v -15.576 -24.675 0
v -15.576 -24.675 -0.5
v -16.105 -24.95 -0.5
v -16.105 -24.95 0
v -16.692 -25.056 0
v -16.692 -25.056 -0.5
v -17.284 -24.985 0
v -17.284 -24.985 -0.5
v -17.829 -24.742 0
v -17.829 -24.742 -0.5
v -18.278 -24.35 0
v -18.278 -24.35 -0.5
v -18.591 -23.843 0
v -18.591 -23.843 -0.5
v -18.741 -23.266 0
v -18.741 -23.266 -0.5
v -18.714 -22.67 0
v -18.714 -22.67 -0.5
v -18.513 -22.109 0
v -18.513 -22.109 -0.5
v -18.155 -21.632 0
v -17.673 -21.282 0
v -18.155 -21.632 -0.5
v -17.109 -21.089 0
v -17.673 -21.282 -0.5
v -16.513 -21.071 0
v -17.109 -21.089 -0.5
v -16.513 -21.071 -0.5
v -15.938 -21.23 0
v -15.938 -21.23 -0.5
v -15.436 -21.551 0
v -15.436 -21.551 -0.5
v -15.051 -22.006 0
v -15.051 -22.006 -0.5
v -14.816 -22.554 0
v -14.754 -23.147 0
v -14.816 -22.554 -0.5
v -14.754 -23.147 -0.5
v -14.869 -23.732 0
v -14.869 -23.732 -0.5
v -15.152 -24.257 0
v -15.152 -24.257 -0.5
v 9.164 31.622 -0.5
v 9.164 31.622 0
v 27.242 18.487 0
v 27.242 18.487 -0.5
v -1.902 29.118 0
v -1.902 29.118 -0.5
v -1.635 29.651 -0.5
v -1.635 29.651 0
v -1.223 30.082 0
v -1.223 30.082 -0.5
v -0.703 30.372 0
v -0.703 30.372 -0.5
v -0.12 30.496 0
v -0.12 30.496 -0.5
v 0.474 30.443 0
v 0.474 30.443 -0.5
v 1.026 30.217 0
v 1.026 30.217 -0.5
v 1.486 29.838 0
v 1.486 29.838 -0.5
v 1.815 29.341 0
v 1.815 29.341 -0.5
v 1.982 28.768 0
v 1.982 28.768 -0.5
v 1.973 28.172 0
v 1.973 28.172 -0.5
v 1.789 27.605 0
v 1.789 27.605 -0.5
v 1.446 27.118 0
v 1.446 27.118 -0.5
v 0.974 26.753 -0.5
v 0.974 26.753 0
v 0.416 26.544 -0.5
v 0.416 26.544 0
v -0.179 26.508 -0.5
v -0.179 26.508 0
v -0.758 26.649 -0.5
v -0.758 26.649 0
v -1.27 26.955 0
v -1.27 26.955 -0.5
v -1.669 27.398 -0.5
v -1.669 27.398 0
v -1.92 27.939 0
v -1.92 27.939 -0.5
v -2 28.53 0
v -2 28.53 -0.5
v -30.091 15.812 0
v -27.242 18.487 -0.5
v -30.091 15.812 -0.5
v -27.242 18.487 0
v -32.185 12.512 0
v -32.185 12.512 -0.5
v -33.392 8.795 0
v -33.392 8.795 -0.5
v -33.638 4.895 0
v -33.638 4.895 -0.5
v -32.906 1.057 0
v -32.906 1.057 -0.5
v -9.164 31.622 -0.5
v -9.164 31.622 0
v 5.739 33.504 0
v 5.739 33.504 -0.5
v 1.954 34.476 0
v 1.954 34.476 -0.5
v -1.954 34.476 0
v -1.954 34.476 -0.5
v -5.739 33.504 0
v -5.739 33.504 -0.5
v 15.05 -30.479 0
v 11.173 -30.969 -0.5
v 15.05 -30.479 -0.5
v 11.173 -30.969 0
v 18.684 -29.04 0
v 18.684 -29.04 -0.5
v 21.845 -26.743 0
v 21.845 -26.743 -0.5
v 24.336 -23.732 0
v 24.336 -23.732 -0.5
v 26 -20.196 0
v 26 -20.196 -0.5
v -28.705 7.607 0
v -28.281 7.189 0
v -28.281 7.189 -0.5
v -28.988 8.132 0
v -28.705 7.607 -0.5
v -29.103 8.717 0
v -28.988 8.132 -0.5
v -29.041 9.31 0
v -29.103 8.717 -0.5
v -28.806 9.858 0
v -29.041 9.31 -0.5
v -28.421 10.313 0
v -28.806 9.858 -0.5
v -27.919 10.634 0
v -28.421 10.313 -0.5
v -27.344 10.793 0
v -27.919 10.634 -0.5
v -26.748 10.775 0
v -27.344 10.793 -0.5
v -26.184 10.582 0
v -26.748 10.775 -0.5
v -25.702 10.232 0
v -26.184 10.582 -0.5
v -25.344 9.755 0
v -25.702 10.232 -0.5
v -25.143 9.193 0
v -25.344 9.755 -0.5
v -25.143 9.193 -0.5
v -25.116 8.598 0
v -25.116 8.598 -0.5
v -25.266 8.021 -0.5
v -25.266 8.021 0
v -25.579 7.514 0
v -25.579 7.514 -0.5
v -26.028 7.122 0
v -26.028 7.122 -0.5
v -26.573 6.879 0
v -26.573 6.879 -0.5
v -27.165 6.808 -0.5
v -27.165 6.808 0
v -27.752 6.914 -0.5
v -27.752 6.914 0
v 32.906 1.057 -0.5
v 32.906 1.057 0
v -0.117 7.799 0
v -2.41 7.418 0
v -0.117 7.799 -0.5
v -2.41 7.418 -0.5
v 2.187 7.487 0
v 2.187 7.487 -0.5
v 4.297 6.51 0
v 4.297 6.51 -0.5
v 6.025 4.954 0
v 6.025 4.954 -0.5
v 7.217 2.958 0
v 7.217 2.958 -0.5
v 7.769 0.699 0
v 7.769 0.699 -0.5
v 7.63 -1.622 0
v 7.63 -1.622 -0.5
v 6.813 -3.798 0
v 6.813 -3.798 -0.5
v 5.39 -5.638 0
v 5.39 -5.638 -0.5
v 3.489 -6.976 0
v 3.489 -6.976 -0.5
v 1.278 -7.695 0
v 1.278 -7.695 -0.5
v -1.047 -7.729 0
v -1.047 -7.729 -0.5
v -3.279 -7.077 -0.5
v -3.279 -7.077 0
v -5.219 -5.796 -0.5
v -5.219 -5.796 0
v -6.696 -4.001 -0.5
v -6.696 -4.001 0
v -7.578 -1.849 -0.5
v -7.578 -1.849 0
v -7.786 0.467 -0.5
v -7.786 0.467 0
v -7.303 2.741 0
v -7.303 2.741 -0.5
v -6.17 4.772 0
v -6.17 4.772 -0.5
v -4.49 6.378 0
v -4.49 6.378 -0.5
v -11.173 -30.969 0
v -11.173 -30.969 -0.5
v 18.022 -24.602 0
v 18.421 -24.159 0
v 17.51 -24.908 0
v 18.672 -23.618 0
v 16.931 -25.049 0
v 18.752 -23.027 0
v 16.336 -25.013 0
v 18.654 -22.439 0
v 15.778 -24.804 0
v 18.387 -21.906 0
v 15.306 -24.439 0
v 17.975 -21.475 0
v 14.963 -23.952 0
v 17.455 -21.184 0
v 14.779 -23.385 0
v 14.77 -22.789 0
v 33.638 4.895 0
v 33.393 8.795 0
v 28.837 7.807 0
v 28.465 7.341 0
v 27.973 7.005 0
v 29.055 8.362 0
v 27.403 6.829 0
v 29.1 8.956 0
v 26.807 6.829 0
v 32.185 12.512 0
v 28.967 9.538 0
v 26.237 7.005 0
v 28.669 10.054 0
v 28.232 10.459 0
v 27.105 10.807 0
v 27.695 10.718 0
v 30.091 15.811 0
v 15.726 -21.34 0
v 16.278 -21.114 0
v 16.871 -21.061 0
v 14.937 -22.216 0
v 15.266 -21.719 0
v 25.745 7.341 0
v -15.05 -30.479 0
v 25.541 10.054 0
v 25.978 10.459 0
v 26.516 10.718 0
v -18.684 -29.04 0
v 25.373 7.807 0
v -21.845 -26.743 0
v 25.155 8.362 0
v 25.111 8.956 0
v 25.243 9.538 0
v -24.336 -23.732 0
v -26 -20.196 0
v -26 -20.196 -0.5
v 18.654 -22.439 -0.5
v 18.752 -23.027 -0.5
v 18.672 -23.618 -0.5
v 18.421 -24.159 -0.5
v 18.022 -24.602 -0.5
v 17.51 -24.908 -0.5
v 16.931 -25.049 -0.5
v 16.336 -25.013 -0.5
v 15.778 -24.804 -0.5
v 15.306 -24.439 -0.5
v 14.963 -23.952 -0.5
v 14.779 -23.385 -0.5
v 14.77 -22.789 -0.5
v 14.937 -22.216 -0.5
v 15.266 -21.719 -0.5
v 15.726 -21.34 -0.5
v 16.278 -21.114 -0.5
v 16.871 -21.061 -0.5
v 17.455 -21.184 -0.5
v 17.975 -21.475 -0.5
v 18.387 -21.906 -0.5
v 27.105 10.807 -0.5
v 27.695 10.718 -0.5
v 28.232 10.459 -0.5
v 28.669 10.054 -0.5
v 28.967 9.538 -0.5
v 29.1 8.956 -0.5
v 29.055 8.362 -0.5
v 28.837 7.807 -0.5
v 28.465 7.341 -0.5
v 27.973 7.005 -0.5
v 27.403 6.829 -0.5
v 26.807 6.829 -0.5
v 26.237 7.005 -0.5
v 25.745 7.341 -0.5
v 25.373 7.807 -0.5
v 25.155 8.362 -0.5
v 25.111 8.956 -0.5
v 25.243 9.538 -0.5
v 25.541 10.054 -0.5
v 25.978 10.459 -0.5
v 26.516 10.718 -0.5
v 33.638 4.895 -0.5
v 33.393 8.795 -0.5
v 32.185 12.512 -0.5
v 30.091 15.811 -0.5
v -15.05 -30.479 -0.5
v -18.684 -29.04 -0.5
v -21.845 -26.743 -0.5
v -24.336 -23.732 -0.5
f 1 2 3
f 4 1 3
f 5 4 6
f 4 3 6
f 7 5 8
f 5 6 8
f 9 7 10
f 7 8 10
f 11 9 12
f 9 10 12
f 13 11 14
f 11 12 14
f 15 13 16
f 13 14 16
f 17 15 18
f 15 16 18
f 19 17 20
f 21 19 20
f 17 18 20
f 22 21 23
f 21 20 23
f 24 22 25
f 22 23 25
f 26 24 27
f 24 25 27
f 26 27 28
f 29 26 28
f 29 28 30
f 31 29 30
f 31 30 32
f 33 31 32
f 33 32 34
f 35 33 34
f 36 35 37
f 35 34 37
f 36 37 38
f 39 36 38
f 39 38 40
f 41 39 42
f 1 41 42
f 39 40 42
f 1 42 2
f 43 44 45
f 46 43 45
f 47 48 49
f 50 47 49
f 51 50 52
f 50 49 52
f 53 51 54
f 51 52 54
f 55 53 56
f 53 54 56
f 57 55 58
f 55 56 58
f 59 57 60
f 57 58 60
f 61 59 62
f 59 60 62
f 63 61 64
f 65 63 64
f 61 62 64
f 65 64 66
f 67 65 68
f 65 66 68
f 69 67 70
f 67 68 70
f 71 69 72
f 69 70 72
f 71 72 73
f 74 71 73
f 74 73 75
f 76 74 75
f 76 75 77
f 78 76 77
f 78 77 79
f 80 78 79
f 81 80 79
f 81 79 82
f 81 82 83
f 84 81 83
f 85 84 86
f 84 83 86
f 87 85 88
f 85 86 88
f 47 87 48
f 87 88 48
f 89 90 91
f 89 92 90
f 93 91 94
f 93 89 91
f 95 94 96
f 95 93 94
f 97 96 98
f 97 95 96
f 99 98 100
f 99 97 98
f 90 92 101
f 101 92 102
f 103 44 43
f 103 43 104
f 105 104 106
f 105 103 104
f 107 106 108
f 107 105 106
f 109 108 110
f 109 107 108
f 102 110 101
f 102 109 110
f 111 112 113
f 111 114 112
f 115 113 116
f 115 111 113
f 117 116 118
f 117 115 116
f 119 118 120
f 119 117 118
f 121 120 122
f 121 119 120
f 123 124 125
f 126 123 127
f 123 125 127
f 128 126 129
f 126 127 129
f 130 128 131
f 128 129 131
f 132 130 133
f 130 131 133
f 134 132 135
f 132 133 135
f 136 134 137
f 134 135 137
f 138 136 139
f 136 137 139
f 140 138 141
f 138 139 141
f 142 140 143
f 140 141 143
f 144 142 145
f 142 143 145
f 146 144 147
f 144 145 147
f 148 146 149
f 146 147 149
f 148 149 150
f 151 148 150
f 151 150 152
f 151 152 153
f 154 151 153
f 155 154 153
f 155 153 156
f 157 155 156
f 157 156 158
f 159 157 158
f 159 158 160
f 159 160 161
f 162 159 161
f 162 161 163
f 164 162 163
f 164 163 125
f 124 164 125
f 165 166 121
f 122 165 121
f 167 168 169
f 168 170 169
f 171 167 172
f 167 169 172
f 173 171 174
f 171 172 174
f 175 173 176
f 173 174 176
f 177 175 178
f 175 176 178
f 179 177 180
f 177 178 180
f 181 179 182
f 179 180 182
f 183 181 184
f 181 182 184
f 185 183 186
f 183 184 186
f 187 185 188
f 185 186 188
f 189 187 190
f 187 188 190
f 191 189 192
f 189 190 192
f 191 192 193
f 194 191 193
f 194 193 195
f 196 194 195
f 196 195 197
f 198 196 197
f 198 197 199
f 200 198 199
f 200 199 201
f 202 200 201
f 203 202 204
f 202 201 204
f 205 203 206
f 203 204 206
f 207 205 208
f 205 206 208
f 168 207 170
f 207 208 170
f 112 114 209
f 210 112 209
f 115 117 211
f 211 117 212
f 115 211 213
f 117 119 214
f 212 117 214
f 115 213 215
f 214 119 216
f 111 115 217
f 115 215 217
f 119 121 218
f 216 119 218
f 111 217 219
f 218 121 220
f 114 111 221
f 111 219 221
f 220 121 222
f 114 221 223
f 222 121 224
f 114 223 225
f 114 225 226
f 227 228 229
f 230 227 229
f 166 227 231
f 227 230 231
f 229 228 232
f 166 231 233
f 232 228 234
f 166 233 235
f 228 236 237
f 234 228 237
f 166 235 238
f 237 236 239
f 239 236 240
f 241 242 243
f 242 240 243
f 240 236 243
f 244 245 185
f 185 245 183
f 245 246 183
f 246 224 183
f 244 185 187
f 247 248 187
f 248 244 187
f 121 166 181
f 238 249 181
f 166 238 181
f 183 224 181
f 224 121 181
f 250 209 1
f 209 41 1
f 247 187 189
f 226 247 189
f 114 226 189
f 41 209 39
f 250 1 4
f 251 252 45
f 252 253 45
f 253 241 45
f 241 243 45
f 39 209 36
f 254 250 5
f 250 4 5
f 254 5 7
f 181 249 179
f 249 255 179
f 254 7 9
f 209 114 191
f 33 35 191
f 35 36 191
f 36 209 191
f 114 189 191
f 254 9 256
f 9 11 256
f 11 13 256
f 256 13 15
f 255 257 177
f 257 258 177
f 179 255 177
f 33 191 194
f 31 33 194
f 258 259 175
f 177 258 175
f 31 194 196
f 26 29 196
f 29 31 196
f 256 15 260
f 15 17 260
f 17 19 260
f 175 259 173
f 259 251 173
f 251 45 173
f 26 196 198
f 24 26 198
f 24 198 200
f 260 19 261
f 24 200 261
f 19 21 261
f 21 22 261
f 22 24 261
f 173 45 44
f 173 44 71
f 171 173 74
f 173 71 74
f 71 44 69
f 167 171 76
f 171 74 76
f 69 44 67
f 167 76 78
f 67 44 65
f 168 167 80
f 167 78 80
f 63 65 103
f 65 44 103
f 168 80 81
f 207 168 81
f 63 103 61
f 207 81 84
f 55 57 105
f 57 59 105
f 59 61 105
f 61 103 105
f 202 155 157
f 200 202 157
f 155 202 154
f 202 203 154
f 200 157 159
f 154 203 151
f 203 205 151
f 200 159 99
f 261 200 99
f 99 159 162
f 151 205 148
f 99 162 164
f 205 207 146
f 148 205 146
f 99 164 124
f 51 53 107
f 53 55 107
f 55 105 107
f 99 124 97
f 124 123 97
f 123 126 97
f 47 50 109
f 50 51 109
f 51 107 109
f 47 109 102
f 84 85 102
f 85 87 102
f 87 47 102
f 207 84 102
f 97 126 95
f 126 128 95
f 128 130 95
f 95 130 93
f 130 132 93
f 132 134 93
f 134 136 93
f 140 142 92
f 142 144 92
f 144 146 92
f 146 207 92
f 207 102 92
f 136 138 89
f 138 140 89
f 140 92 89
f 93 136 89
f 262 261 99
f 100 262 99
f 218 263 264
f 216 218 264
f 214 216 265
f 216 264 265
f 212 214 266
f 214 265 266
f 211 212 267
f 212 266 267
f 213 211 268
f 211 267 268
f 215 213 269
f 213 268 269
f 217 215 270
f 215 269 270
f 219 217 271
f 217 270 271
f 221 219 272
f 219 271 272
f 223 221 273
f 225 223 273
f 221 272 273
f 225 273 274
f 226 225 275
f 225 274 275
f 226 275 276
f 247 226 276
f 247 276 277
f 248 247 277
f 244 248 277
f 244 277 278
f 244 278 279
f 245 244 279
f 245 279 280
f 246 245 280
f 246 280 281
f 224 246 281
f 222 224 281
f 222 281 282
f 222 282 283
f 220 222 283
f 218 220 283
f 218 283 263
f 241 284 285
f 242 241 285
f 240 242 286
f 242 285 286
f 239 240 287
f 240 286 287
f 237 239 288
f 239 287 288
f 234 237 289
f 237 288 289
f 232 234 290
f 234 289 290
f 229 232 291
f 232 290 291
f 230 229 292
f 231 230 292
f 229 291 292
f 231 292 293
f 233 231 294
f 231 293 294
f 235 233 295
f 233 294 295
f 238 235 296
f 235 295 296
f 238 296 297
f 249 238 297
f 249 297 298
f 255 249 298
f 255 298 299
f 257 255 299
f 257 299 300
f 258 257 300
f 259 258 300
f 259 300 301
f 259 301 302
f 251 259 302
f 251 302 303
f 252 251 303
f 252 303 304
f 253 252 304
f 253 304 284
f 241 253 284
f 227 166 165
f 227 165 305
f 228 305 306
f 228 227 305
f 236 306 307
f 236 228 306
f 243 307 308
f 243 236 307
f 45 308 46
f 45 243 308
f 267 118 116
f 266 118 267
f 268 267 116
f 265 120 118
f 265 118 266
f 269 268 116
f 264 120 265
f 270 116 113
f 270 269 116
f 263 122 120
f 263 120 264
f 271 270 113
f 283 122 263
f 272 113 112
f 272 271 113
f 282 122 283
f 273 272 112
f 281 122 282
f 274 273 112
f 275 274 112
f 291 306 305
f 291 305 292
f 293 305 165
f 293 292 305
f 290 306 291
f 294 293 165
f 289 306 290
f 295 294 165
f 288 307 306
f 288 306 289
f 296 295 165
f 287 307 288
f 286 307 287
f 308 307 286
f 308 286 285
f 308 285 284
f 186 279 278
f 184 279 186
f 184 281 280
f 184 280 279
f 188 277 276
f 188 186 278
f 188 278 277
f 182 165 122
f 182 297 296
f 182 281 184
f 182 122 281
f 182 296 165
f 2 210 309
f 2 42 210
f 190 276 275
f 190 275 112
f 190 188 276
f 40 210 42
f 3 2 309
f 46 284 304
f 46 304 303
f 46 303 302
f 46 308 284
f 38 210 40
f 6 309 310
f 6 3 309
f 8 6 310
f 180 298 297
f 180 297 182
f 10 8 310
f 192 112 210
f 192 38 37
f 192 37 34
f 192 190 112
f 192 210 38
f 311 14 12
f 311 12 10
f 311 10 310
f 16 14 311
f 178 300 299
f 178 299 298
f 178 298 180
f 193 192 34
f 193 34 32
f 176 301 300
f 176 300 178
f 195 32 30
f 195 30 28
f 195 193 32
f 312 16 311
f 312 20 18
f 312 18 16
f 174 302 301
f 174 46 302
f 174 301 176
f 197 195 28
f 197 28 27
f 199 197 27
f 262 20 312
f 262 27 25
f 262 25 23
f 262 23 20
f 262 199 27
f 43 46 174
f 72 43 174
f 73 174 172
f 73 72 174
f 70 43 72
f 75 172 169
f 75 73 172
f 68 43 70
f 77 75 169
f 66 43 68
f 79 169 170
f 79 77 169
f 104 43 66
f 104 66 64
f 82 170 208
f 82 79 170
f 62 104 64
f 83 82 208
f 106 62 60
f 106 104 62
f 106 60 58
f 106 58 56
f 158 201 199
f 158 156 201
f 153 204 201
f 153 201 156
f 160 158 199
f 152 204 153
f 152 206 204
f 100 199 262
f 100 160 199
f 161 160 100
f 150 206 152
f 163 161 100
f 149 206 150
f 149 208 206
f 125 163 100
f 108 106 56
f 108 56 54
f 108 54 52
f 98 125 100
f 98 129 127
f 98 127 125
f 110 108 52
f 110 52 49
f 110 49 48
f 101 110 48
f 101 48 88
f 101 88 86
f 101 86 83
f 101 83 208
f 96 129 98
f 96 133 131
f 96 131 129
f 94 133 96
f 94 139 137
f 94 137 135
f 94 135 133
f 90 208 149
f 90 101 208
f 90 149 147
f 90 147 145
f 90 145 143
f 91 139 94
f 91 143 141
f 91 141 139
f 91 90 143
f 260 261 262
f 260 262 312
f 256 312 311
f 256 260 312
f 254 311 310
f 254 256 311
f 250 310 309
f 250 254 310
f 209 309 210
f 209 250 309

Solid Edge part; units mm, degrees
sketch "Sketch1" plane through (0, 0, 0) normal (0, 0, -1) x (-1, 0, 0)
  line L0 (-9.1636, 31.6216) -> (-27.2423, 18.4866)
  arc A0 (-27.2423, 18.4866) -> (-32.9056, 1.0566) centre (-18.0788, 5.8742) ccw
  line L1 (-32.9056, 1.0566) -> (-26.0002, -20.1962)
  arc A1 (-26.0002, -20.1962) -> (-11.1732, -30.9686) centre (-11.1732, -15.3786) ccw
  line L2 (-11.1732, -30.9686) -> (11.1732, -30.9686)
  arc A2 (26.0002, -20.1962) -> (11.1732, -30.9686) centre (11.1732, -15.3786) cw
  line L3 (26.0002, -20.1962) -> (32.9056, 1.0565)
  arc A3 (32.9056, 1.0565) -> (27.2422, 18.4867) centre (18.0786, 5.8741) ccw
  line L4 (27.2422, 18.4867) -> (9.1636, 31.6216)
  arc A4 (9.1636, 31.6216) -> (-9.1636, 31.6216) centre (0, 19.009) ccw
extrude "Protrusion1" add sketch "Sketch1" along normal blind 0.5
hole "Furat_1" at (27.1051, 8.807, -0.5) direction (0, 0, 1) diameter 4 end through all
pattern_circular "MintaElőfordulás_1" count 5 over 360 about axis through (0, 0, -0.5) along (0, 0, 1) of "Furat_1"
sketch "Sketch2" plane through (0, 1.8152, -0.5) normal (0, 0, -1) x (-0.309017, 0.9510565, 0)
  circle A0 centre (-1.7263, -0.5609) radius 7.8
extrude "Kivágás_1" cut sketch "Sketch2" against normal blind 32.365
properties material "Szilikon"
